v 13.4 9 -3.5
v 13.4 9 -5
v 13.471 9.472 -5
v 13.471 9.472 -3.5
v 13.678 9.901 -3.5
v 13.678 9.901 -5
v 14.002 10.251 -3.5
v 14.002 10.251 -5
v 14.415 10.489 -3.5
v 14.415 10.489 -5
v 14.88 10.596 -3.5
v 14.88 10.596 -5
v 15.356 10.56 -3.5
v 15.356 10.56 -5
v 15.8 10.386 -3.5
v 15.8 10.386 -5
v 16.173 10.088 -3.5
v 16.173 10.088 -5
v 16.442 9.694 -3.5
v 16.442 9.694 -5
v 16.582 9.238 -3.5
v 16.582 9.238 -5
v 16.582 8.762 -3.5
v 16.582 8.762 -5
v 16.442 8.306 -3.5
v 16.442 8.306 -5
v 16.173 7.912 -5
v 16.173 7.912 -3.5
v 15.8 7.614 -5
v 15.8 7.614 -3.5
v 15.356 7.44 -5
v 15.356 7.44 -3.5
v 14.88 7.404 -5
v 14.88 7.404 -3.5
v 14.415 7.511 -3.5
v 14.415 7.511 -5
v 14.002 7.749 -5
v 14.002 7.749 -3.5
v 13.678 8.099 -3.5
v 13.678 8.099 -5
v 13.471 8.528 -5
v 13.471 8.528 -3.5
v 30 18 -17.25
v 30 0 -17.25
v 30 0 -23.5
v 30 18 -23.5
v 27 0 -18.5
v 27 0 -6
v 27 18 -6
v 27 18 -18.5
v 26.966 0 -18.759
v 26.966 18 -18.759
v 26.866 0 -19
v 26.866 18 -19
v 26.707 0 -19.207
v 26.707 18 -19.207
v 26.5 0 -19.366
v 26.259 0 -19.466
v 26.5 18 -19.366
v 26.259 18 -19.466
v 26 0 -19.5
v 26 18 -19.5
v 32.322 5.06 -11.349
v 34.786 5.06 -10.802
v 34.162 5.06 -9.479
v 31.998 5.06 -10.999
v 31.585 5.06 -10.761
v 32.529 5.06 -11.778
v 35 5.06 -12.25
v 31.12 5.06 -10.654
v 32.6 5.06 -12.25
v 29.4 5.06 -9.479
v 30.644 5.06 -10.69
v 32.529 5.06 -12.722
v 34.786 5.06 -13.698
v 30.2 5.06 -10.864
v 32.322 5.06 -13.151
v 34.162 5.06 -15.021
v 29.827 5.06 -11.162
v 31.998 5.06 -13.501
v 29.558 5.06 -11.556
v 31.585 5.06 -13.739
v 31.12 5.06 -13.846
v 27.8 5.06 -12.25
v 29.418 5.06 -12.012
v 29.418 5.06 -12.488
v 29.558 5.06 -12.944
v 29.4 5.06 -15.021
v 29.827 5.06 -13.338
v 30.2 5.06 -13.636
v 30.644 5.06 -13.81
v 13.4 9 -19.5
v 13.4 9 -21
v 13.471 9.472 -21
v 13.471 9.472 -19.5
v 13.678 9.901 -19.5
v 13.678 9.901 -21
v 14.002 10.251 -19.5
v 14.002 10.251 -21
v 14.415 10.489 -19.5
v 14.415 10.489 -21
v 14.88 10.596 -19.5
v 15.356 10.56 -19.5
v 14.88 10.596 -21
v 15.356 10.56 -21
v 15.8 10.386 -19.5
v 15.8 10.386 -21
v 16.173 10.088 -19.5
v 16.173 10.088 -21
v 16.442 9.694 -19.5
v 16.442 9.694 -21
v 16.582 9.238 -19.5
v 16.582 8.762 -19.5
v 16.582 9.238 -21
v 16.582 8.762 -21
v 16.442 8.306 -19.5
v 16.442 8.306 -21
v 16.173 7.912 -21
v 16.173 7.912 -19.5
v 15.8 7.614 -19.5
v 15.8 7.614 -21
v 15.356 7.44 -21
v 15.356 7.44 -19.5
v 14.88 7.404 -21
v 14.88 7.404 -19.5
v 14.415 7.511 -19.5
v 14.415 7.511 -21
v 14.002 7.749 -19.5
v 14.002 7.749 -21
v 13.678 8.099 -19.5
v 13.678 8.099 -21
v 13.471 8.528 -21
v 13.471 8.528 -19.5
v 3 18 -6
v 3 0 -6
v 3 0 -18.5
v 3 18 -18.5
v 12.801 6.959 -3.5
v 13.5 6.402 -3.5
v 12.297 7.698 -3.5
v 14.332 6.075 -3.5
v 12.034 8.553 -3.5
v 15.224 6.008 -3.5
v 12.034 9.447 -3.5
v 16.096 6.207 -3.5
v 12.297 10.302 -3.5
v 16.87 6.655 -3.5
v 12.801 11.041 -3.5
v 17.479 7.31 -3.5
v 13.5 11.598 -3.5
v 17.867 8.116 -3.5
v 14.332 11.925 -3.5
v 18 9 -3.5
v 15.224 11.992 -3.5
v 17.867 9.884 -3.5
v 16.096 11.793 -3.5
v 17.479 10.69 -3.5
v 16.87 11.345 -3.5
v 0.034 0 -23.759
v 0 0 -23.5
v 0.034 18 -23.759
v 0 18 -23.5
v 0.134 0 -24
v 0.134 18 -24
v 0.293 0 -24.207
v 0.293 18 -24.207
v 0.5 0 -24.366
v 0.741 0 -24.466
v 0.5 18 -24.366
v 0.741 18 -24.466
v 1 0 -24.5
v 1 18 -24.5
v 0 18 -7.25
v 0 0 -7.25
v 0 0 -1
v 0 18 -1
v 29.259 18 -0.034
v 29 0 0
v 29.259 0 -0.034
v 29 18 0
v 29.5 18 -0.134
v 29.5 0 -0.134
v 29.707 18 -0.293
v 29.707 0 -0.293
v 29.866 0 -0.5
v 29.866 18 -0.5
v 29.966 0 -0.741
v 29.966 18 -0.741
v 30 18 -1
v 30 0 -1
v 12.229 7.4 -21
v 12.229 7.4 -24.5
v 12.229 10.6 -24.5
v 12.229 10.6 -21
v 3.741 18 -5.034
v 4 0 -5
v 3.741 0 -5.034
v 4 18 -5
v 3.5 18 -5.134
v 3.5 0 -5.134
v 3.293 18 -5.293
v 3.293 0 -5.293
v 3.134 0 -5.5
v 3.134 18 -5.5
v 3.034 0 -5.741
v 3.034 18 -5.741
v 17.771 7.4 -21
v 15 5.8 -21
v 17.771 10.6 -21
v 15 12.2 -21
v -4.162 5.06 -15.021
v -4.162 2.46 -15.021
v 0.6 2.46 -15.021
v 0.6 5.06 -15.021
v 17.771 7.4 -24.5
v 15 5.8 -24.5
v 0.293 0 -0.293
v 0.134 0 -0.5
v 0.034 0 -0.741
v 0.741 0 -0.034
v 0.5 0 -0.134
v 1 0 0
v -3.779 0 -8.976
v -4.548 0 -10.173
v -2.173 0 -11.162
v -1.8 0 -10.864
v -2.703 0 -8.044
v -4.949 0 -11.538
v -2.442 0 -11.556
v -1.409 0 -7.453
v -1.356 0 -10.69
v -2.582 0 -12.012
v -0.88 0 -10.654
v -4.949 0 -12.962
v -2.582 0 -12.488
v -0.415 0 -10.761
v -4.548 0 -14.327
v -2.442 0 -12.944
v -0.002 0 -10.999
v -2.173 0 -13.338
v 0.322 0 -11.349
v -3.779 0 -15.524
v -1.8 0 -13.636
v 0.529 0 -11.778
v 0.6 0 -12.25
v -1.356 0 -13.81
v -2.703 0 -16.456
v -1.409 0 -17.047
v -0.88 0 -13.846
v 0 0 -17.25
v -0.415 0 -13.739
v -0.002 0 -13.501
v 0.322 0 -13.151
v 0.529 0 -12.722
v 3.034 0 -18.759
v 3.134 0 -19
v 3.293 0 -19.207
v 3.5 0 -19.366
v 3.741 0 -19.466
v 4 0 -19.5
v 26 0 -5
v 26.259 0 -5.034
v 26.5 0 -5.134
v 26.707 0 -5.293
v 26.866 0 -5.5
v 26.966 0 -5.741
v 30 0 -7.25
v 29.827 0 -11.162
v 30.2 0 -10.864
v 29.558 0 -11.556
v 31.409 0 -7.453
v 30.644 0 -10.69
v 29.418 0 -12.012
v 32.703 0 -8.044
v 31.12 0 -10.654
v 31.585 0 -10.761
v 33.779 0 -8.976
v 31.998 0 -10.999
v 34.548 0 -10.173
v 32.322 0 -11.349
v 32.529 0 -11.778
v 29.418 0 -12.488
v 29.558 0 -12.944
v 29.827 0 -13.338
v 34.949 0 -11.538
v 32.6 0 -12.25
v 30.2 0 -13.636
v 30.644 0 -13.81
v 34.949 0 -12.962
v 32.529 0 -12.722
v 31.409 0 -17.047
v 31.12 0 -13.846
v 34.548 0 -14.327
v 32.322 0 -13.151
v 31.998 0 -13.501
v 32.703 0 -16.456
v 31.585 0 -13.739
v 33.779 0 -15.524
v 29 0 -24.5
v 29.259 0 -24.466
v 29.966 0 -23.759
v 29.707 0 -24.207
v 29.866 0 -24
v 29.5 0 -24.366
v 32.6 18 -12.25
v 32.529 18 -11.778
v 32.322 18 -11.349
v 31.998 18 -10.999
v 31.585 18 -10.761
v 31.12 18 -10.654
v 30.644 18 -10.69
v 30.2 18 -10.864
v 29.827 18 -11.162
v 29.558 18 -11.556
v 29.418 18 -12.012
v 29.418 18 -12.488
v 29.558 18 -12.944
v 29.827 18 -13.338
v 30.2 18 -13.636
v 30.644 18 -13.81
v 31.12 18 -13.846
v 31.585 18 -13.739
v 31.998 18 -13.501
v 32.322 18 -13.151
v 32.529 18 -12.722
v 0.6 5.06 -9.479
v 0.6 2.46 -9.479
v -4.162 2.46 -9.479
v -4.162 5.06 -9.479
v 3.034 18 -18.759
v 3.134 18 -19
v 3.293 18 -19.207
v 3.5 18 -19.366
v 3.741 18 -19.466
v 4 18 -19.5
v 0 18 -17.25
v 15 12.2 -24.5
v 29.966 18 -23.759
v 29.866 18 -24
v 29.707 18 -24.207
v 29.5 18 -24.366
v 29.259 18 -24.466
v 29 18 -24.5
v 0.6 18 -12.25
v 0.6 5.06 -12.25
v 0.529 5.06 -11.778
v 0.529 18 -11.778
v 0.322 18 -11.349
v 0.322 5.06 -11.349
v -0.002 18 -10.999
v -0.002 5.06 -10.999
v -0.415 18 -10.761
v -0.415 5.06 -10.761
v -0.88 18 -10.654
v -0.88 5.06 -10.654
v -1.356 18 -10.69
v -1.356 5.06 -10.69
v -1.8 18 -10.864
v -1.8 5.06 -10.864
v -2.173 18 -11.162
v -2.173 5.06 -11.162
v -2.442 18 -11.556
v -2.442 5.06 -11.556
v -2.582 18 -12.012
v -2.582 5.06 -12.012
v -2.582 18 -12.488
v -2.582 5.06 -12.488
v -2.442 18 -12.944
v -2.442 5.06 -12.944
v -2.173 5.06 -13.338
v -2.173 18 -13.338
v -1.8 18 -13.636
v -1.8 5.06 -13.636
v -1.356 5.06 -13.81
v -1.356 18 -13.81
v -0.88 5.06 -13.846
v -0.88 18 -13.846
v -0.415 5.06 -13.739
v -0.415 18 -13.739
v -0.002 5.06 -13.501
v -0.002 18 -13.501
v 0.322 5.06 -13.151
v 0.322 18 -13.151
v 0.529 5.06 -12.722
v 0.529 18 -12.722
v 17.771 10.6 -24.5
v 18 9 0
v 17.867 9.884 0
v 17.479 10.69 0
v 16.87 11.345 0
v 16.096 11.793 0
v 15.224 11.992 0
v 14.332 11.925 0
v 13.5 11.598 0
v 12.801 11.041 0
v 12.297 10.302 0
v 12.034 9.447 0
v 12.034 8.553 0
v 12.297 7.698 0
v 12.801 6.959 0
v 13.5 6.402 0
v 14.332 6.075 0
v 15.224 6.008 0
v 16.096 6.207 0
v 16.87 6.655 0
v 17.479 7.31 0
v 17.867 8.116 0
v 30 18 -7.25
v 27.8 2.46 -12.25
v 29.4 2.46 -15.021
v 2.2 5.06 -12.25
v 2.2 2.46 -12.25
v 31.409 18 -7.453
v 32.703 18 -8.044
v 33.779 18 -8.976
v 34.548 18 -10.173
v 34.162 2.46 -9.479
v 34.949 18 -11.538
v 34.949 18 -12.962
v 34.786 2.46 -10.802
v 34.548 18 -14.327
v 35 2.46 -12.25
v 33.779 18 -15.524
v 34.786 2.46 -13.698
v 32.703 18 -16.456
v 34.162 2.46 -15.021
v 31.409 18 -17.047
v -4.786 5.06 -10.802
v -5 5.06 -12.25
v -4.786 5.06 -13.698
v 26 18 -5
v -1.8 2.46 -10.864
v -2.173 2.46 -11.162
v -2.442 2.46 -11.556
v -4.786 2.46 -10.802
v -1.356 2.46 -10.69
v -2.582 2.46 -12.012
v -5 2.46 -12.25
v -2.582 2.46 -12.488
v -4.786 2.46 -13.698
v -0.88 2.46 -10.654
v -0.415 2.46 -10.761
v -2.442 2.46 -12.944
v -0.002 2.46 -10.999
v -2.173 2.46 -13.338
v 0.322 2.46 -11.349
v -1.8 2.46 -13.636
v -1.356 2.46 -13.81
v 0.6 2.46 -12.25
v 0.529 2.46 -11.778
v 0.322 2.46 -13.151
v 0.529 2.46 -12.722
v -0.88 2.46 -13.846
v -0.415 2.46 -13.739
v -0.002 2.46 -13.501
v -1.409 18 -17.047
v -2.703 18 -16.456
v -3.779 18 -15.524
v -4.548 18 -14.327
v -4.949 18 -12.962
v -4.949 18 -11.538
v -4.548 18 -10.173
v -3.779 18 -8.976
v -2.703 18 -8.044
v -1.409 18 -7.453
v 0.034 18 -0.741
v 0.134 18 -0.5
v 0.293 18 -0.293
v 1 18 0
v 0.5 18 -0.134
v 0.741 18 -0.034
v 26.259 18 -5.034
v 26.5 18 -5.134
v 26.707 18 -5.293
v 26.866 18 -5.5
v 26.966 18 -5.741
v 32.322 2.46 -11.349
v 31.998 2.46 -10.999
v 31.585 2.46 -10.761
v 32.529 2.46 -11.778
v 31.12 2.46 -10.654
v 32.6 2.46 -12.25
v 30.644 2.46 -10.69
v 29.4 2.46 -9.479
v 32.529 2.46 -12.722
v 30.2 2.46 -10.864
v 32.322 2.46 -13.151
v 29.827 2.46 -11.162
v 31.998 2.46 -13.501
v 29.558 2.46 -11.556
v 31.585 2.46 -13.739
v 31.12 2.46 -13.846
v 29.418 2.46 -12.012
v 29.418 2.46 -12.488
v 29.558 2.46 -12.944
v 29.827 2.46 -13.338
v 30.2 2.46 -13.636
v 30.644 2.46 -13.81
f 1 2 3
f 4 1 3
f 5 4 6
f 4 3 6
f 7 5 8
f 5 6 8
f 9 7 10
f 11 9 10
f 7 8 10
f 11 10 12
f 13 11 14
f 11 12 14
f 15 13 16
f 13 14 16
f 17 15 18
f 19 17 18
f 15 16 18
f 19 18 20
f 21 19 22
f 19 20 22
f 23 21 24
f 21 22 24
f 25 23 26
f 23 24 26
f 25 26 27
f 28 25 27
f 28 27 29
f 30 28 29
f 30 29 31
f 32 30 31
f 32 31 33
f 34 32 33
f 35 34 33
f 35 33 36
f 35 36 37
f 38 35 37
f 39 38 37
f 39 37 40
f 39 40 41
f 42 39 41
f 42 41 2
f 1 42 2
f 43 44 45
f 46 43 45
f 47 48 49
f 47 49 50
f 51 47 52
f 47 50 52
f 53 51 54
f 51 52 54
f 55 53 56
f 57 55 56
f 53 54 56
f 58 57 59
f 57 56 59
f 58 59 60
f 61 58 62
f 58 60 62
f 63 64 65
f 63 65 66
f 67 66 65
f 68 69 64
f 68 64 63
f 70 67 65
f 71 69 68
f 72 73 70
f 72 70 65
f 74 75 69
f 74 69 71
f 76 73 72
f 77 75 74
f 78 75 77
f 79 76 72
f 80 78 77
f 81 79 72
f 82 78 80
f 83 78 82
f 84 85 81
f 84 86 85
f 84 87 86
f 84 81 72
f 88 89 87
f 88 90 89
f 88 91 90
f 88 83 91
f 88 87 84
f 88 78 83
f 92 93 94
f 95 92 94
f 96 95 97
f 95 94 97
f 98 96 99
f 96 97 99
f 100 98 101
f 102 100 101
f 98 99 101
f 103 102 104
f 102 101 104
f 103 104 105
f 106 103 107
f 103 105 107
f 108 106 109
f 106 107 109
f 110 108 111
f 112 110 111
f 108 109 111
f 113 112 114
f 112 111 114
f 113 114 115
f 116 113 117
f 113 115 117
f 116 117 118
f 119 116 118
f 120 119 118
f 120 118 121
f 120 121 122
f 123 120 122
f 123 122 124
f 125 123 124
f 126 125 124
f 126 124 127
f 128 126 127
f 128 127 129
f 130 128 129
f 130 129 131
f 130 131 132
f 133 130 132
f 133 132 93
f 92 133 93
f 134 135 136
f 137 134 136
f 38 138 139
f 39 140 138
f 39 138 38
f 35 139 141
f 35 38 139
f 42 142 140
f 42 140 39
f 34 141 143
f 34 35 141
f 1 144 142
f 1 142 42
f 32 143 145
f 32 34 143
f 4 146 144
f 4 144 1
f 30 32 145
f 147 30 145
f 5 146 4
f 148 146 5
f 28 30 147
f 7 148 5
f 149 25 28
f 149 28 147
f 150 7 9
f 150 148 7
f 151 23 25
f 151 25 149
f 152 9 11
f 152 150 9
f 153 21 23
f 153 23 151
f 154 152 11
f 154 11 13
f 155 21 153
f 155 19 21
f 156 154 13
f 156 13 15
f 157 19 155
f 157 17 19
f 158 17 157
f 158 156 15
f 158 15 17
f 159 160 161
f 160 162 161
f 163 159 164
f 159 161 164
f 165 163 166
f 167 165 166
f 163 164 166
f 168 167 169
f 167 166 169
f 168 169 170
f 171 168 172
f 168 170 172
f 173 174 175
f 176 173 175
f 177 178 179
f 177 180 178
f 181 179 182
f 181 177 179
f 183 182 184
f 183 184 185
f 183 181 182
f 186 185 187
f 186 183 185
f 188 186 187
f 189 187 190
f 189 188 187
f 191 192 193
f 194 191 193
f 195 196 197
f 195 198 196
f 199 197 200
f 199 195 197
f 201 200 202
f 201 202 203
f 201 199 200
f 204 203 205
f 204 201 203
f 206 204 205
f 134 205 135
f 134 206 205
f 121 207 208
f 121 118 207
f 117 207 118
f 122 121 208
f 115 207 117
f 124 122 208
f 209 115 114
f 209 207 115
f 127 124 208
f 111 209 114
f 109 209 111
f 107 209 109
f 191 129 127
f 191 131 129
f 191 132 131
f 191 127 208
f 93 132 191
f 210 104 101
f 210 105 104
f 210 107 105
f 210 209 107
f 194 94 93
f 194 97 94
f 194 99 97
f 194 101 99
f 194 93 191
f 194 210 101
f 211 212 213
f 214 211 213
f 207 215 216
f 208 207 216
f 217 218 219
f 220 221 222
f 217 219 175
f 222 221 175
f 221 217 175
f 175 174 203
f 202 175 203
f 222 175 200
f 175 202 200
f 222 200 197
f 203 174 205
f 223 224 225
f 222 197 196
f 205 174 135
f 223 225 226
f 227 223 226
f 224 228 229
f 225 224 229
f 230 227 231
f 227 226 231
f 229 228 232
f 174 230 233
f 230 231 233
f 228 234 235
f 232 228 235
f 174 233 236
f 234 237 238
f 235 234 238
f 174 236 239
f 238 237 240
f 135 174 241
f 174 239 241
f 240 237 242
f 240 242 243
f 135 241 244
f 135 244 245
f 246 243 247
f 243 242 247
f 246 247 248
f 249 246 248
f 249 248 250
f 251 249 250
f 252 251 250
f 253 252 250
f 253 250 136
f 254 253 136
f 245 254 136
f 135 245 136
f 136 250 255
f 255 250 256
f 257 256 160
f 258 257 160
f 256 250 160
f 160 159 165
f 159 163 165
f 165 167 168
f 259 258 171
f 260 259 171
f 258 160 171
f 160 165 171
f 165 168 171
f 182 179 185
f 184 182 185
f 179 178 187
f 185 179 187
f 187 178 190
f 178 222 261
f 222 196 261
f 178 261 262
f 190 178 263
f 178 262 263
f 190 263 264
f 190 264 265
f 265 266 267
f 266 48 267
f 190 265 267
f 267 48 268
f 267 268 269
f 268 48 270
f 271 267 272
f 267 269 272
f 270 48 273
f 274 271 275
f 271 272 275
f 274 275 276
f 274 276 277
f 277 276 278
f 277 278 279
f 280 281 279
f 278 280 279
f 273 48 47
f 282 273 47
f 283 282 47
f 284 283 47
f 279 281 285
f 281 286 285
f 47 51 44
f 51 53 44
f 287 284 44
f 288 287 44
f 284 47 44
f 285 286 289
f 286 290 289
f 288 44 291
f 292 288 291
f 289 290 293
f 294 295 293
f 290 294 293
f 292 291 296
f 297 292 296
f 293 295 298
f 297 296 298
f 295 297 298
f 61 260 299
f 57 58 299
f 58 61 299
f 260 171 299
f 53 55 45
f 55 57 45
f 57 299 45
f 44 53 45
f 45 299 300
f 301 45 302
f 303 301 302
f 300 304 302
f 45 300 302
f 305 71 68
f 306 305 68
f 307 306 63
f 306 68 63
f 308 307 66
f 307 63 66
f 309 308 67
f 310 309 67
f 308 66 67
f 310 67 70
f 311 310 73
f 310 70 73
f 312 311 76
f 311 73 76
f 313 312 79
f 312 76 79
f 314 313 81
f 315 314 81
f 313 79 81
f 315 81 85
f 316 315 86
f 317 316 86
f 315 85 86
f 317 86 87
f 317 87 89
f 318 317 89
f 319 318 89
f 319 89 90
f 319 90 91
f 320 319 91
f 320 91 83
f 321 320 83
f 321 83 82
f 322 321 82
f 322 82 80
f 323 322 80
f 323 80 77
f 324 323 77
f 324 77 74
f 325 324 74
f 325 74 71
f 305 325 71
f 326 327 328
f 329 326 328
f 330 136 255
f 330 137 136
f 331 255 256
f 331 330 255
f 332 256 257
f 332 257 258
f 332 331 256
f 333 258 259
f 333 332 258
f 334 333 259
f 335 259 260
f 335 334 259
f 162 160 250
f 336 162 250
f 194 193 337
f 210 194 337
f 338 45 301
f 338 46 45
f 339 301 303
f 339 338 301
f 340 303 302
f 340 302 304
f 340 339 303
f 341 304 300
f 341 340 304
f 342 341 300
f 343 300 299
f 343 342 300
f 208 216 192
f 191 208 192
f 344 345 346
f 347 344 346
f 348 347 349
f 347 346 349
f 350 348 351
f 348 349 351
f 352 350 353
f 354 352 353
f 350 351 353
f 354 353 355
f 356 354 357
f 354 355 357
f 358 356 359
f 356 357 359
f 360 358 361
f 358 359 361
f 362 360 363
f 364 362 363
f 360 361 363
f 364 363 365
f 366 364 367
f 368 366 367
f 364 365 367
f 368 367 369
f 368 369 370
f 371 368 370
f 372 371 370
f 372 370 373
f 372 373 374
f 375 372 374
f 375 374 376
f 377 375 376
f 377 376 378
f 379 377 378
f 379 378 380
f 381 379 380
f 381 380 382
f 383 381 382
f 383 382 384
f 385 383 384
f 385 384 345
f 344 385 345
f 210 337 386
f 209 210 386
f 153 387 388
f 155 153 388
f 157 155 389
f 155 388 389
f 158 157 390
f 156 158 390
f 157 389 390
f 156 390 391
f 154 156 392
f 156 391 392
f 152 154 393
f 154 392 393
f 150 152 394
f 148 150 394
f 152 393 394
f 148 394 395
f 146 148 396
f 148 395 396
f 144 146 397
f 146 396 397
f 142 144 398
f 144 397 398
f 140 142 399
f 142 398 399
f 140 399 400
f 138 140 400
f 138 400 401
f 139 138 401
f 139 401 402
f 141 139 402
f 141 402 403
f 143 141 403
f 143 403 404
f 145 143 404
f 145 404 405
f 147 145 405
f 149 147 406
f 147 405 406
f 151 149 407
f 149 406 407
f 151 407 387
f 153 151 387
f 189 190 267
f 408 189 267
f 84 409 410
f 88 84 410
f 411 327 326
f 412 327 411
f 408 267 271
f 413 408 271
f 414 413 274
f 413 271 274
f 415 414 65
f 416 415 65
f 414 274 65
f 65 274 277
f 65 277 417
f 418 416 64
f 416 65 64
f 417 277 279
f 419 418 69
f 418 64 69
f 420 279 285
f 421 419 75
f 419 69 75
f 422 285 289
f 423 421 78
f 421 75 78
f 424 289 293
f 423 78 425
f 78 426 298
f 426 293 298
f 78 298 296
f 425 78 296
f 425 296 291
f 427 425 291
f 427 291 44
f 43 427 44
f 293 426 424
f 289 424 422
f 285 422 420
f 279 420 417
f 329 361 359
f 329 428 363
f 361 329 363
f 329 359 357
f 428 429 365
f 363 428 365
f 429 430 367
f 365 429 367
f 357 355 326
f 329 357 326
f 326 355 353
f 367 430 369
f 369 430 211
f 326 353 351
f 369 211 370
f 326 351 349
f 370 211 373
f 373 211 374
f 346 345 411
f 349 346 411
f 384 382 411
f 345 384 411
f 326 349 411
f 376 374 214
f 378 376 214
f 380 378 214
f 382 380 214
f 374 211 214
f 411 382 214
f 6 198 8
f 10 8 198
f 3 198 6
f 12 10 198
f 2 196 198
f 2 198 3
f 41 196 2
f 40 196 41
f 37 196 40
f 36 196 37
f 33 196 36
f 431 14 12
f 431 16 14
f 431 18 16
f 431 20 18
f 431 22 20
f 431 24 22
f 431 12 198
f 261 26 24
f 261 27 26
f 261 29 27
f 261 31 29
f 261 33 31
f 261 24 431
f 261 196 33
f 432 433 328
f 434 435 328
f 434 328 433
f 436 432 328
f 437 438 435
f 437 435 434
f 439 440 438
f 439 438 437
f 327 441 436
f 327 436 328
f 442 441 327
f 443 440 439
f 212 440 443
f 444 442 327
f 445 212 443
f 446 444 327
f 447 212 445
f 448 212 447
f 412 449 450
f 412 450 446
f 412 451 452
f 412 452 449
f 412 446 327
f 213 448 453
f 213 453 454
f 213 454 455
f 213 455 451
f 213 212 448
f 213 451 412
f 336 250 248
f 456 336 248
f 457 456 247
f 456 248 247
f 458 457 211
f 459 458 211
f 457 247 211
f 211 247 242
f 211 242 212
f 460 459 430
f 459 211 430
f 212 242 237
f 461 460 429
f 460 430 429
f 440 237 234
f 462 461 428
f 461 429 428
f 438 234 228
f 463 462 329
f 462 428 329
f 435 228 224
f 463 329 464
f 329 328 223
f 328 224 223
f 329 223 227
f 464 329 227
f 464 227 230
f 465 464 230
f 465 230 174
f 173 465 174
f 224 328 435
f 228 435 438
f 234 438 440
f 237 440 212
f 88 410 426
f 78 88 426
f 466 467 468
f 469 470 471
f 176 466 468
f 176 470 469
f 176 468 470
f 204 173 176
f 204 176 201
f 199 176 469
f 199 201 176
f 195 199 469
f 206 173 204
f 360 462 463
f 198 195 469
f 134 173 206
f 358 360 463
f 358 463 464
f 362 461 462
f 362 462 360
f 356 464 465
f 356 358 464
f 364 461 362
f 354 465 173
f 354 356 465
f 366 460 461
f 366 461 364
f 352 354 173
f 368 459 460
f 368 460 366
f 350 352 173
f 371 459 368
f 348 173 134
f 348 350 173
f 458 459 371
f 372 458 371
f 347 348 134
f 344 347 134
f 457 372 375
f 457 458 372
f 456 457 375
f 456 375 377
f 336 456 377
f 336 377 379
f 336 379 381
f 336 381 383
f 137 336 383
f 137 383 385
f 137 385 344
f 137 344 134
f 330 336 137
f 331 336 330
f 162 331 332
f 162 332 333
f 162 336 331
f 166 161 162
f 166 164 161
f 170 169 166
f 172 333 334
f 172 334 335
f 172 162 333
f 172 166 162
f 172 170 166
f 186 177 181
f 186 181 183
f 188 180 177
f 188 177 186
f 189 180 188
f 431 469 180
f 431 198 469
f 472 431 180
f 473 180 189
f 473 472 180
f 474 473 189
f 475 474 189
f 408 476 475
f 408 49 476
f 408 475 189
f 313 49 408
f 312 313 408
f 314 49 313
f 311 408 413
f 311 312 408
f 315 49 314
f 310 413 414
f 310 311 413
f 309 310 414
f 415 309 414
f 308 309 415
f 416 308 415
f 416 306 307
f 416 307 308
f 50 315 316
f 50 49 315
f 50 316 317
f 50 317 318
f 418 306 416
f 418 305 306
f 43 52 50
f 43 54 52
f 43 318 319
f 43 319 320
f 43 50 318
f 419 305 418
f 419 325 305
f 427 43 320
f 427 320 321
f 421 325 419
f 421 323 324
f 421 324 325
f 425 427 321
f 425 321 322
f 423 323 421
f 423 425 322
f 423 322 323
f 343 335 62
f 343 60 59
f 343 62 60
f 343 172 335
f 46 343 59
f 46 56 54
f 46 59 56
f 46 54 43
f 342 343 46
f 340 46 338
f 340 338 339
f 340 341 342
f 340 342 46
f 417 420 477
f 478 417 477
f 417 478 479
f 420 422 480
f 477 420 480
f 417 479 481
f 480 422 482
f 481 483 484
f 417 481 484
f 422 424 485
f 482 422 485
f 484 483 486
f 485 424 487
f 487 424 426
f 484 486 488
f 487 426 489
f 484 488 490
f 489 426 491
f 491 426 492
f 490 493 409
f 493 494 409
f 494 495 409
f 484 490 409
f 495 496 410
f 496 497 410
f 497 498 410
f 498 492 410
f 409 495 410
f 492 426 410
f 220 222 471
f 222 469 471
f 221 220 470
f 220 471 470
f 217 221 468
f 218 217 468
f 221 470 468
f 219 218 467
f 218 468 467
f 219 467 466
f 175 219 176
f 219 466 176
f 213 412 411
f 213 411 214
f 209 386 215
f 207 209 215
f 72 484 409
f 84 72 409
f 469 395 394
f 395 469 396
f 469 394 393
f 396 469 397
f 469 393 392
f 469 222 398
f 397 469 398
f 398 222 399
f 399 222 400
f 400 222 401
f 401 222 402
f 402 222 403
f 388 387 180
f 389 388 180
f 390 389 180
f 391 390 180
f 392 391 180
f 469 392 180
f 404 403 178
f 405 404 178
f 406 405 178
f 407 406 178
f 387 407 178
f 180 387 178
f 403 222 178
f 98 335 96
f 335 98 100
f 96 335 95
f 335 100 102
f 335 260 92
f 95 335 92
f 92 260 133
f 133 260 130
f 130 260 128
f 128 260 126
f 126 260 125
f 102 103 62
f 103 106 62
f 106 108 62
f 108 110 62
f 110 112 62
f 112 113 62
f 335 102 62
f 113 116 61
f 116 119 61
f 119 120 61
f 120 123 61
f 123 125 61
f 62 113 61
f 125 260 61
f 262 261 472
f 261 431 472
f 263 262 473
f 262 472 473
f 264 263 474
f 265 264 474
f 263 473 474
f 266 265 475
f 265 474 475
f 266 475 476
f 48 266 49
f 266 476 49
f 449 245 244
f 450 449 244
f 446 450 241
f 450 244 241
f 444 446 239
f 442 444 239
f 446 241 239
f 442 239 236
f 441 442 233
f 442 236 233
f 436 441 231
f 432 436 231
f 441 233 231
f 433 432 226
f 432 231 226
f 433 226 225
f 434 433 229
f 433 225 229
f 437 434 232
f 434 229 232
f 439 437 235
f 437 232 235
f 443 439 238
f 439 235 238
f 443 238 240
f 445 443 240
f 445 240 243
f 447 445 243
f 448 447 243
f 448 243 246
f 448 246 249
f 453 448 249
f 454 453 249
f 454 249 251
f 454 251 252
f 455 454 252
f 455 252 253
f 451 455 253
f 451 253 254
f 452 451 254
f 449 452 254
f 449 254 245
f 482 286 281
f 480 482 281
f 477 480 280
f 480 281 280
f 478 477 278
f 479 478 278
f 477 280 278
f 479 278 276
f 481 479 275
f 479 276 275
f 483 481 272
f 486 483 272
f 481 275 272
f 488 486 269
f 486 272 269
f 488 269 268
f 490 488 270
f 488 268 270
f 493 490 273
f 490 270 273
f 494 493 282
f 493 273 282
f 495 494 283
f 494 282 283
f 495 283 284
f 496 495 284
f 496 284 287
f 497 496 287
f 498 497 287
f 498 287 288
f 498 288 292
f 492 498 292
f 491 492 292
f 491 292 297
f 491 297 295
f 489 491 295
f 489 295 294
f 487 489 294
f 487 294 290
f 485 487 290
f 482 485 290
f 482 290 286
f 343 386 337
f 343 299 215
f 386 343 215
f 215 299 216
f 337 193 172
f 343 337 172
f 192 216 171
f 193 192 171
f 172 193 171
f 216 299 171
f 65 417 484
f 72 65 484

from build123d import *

# Parameters (mm, degrees)
SKETCH1_W           = 24
SKETCH1_H           = 14.5
BOSS_EXTRUDE1_DEPTH = 18
SKETCH2_R           = 1.6
CUT_EXTRUDE1_DEPTH  = 19
SKETCH3_R           = 1.6
CUT_EXTRUDE2_DEPTH  = 25.5
SKETCH4_R           = 3
CUT_EXTRUDE3_DEPTH  = 3.5
CUT_EXTRUDE4_DEPTH  = 3.5
FILLET1_R           = 1
CUT_EXTRUDE5_DEPTH  = 2.6


with BuildPart() as part:
    # Sketch1 → Boss-Extrude1 (new body)
    with BuildSketch(Plane(origin=(0, 0, 0), x_dir=(1, 0, 0), z_dir=(0, 1, 0))):
        with BuildLine():
            Line((0, 0), (30, 0))
            Line((30, 0), (30, 7.25))
            ThreePointArc((30, 7.25), (35, 12.25), (30, 17.25))
            Line((30, 17.25), (30, 24.5))
            Line((30, 24.5), (0, 24.5))
            Line((0, 24.5), (0, 17.25))
            ThreePointArc((0, 17.25), (-5, 12.25), (0, 7.25))
            Line((0, 7.25), (0, 0))
        make_face()
        with Locations((15, 12.25)):
            Rectangle(SKETCH1_W, SKETCH1_H, mode=Mode.SUBTRACT)
    extrude(amount=BOSS_EXTRUDE1_DEPTH)

    # Sketch2 → Cut-Extrude1 (cut, through all)
    with BuildSketch(Plane.XZ):
        with Locations((31, -12.25)):
            Circle(SKETCH2_R)
        with Locations((-1, -12.25)):
            Circle(SKETCH2_R)
    extrude(amount=-CUT_EXTRUDE1_DEPTH, mode=Mode.SUBTRACT)

    # Sketch3 → Cut-Extrude2 (cut, through all)
    with BuildSketch(Plane(origin=(0, 0, -24.5), x_dir=(-1, 0, 0), z_dir=(0, 0, -1))):
        with Locations((-15, 9)):
            Circle(SKETCH3_R)
    extrude(amount=-CUT_EXTRUDE2_DEPTH, mode=Mode.SUBTRACT)

    # Sketch4 → Cut-Extrude3 (cut)
    with BuildSketch(Plane.XY):
        with Locations((15, 9)):
            Circle(SKETCH4_R)
    extrude(amount=-CUT_EXTRUDE3_DEPTH, mode=Mode.SUBTRACT)

    # Sketch5 → Cut-Extrude4 (cut)
    with BuildSketch(Plane(origin=(0, 0, -24.5), x_dir=(-1, 0, 0), z_dir=(0, 0, -1))):
        Polygon((-12.228718708, 7.4), (-12.228718708, 10.6), (-15, 12.2), (-17.771281292, 10.6), (-17.771281292, 7.4), (-15, 5.8), align=None)
    extrude(amount=-CUT_EXTRUDE4_DEPTH, mode=Mode.SUBTRACT)

    # Fillet1
    fillet1_edges = [part.edges().sort_by_distance(p)[0] for p in [
        (0, 9, -24.5),
        (30, 9, -24.5),
        (30, 9, 0),
        (0, 9, 0),
        (27, 9, -5),
        (27, 9, -19.5),
        (3, 9, -19.5),
        (3, 9, -5),
    ]]
    fillet(fillet1_edges, radius=FILLET1_R)

    # Sketch6 → Cut-Extrude5 (cut)
    with BuildSketch(Plane(origin=(0, 2.46, 0), x_dir=(-1, 0, 0), z_dir=(0, -1, 0))):
        Polygon((-32.6, 15.021281292), (-42.6, 15.021281292), (-42.6, 9.478718708), (-32.6, 9.478718708), (-29.4, 9.478718708), (-27.8, 12.25), (-29.4, 15.021281292), align=None)
        Polygon((-0.6, 15.021281292), (2.6, 15.021281292), (12.6, 15.021281292), (12.6, 9.478718708), (2.6, 9.478718708), (-0.6, 9.478718708), (-2.2, 12.25), align=None)
    extrude(amount=-CUT_EXTRUDE5_DEPTH, mode=Mode.SUBTRACT)


solid = part.part
